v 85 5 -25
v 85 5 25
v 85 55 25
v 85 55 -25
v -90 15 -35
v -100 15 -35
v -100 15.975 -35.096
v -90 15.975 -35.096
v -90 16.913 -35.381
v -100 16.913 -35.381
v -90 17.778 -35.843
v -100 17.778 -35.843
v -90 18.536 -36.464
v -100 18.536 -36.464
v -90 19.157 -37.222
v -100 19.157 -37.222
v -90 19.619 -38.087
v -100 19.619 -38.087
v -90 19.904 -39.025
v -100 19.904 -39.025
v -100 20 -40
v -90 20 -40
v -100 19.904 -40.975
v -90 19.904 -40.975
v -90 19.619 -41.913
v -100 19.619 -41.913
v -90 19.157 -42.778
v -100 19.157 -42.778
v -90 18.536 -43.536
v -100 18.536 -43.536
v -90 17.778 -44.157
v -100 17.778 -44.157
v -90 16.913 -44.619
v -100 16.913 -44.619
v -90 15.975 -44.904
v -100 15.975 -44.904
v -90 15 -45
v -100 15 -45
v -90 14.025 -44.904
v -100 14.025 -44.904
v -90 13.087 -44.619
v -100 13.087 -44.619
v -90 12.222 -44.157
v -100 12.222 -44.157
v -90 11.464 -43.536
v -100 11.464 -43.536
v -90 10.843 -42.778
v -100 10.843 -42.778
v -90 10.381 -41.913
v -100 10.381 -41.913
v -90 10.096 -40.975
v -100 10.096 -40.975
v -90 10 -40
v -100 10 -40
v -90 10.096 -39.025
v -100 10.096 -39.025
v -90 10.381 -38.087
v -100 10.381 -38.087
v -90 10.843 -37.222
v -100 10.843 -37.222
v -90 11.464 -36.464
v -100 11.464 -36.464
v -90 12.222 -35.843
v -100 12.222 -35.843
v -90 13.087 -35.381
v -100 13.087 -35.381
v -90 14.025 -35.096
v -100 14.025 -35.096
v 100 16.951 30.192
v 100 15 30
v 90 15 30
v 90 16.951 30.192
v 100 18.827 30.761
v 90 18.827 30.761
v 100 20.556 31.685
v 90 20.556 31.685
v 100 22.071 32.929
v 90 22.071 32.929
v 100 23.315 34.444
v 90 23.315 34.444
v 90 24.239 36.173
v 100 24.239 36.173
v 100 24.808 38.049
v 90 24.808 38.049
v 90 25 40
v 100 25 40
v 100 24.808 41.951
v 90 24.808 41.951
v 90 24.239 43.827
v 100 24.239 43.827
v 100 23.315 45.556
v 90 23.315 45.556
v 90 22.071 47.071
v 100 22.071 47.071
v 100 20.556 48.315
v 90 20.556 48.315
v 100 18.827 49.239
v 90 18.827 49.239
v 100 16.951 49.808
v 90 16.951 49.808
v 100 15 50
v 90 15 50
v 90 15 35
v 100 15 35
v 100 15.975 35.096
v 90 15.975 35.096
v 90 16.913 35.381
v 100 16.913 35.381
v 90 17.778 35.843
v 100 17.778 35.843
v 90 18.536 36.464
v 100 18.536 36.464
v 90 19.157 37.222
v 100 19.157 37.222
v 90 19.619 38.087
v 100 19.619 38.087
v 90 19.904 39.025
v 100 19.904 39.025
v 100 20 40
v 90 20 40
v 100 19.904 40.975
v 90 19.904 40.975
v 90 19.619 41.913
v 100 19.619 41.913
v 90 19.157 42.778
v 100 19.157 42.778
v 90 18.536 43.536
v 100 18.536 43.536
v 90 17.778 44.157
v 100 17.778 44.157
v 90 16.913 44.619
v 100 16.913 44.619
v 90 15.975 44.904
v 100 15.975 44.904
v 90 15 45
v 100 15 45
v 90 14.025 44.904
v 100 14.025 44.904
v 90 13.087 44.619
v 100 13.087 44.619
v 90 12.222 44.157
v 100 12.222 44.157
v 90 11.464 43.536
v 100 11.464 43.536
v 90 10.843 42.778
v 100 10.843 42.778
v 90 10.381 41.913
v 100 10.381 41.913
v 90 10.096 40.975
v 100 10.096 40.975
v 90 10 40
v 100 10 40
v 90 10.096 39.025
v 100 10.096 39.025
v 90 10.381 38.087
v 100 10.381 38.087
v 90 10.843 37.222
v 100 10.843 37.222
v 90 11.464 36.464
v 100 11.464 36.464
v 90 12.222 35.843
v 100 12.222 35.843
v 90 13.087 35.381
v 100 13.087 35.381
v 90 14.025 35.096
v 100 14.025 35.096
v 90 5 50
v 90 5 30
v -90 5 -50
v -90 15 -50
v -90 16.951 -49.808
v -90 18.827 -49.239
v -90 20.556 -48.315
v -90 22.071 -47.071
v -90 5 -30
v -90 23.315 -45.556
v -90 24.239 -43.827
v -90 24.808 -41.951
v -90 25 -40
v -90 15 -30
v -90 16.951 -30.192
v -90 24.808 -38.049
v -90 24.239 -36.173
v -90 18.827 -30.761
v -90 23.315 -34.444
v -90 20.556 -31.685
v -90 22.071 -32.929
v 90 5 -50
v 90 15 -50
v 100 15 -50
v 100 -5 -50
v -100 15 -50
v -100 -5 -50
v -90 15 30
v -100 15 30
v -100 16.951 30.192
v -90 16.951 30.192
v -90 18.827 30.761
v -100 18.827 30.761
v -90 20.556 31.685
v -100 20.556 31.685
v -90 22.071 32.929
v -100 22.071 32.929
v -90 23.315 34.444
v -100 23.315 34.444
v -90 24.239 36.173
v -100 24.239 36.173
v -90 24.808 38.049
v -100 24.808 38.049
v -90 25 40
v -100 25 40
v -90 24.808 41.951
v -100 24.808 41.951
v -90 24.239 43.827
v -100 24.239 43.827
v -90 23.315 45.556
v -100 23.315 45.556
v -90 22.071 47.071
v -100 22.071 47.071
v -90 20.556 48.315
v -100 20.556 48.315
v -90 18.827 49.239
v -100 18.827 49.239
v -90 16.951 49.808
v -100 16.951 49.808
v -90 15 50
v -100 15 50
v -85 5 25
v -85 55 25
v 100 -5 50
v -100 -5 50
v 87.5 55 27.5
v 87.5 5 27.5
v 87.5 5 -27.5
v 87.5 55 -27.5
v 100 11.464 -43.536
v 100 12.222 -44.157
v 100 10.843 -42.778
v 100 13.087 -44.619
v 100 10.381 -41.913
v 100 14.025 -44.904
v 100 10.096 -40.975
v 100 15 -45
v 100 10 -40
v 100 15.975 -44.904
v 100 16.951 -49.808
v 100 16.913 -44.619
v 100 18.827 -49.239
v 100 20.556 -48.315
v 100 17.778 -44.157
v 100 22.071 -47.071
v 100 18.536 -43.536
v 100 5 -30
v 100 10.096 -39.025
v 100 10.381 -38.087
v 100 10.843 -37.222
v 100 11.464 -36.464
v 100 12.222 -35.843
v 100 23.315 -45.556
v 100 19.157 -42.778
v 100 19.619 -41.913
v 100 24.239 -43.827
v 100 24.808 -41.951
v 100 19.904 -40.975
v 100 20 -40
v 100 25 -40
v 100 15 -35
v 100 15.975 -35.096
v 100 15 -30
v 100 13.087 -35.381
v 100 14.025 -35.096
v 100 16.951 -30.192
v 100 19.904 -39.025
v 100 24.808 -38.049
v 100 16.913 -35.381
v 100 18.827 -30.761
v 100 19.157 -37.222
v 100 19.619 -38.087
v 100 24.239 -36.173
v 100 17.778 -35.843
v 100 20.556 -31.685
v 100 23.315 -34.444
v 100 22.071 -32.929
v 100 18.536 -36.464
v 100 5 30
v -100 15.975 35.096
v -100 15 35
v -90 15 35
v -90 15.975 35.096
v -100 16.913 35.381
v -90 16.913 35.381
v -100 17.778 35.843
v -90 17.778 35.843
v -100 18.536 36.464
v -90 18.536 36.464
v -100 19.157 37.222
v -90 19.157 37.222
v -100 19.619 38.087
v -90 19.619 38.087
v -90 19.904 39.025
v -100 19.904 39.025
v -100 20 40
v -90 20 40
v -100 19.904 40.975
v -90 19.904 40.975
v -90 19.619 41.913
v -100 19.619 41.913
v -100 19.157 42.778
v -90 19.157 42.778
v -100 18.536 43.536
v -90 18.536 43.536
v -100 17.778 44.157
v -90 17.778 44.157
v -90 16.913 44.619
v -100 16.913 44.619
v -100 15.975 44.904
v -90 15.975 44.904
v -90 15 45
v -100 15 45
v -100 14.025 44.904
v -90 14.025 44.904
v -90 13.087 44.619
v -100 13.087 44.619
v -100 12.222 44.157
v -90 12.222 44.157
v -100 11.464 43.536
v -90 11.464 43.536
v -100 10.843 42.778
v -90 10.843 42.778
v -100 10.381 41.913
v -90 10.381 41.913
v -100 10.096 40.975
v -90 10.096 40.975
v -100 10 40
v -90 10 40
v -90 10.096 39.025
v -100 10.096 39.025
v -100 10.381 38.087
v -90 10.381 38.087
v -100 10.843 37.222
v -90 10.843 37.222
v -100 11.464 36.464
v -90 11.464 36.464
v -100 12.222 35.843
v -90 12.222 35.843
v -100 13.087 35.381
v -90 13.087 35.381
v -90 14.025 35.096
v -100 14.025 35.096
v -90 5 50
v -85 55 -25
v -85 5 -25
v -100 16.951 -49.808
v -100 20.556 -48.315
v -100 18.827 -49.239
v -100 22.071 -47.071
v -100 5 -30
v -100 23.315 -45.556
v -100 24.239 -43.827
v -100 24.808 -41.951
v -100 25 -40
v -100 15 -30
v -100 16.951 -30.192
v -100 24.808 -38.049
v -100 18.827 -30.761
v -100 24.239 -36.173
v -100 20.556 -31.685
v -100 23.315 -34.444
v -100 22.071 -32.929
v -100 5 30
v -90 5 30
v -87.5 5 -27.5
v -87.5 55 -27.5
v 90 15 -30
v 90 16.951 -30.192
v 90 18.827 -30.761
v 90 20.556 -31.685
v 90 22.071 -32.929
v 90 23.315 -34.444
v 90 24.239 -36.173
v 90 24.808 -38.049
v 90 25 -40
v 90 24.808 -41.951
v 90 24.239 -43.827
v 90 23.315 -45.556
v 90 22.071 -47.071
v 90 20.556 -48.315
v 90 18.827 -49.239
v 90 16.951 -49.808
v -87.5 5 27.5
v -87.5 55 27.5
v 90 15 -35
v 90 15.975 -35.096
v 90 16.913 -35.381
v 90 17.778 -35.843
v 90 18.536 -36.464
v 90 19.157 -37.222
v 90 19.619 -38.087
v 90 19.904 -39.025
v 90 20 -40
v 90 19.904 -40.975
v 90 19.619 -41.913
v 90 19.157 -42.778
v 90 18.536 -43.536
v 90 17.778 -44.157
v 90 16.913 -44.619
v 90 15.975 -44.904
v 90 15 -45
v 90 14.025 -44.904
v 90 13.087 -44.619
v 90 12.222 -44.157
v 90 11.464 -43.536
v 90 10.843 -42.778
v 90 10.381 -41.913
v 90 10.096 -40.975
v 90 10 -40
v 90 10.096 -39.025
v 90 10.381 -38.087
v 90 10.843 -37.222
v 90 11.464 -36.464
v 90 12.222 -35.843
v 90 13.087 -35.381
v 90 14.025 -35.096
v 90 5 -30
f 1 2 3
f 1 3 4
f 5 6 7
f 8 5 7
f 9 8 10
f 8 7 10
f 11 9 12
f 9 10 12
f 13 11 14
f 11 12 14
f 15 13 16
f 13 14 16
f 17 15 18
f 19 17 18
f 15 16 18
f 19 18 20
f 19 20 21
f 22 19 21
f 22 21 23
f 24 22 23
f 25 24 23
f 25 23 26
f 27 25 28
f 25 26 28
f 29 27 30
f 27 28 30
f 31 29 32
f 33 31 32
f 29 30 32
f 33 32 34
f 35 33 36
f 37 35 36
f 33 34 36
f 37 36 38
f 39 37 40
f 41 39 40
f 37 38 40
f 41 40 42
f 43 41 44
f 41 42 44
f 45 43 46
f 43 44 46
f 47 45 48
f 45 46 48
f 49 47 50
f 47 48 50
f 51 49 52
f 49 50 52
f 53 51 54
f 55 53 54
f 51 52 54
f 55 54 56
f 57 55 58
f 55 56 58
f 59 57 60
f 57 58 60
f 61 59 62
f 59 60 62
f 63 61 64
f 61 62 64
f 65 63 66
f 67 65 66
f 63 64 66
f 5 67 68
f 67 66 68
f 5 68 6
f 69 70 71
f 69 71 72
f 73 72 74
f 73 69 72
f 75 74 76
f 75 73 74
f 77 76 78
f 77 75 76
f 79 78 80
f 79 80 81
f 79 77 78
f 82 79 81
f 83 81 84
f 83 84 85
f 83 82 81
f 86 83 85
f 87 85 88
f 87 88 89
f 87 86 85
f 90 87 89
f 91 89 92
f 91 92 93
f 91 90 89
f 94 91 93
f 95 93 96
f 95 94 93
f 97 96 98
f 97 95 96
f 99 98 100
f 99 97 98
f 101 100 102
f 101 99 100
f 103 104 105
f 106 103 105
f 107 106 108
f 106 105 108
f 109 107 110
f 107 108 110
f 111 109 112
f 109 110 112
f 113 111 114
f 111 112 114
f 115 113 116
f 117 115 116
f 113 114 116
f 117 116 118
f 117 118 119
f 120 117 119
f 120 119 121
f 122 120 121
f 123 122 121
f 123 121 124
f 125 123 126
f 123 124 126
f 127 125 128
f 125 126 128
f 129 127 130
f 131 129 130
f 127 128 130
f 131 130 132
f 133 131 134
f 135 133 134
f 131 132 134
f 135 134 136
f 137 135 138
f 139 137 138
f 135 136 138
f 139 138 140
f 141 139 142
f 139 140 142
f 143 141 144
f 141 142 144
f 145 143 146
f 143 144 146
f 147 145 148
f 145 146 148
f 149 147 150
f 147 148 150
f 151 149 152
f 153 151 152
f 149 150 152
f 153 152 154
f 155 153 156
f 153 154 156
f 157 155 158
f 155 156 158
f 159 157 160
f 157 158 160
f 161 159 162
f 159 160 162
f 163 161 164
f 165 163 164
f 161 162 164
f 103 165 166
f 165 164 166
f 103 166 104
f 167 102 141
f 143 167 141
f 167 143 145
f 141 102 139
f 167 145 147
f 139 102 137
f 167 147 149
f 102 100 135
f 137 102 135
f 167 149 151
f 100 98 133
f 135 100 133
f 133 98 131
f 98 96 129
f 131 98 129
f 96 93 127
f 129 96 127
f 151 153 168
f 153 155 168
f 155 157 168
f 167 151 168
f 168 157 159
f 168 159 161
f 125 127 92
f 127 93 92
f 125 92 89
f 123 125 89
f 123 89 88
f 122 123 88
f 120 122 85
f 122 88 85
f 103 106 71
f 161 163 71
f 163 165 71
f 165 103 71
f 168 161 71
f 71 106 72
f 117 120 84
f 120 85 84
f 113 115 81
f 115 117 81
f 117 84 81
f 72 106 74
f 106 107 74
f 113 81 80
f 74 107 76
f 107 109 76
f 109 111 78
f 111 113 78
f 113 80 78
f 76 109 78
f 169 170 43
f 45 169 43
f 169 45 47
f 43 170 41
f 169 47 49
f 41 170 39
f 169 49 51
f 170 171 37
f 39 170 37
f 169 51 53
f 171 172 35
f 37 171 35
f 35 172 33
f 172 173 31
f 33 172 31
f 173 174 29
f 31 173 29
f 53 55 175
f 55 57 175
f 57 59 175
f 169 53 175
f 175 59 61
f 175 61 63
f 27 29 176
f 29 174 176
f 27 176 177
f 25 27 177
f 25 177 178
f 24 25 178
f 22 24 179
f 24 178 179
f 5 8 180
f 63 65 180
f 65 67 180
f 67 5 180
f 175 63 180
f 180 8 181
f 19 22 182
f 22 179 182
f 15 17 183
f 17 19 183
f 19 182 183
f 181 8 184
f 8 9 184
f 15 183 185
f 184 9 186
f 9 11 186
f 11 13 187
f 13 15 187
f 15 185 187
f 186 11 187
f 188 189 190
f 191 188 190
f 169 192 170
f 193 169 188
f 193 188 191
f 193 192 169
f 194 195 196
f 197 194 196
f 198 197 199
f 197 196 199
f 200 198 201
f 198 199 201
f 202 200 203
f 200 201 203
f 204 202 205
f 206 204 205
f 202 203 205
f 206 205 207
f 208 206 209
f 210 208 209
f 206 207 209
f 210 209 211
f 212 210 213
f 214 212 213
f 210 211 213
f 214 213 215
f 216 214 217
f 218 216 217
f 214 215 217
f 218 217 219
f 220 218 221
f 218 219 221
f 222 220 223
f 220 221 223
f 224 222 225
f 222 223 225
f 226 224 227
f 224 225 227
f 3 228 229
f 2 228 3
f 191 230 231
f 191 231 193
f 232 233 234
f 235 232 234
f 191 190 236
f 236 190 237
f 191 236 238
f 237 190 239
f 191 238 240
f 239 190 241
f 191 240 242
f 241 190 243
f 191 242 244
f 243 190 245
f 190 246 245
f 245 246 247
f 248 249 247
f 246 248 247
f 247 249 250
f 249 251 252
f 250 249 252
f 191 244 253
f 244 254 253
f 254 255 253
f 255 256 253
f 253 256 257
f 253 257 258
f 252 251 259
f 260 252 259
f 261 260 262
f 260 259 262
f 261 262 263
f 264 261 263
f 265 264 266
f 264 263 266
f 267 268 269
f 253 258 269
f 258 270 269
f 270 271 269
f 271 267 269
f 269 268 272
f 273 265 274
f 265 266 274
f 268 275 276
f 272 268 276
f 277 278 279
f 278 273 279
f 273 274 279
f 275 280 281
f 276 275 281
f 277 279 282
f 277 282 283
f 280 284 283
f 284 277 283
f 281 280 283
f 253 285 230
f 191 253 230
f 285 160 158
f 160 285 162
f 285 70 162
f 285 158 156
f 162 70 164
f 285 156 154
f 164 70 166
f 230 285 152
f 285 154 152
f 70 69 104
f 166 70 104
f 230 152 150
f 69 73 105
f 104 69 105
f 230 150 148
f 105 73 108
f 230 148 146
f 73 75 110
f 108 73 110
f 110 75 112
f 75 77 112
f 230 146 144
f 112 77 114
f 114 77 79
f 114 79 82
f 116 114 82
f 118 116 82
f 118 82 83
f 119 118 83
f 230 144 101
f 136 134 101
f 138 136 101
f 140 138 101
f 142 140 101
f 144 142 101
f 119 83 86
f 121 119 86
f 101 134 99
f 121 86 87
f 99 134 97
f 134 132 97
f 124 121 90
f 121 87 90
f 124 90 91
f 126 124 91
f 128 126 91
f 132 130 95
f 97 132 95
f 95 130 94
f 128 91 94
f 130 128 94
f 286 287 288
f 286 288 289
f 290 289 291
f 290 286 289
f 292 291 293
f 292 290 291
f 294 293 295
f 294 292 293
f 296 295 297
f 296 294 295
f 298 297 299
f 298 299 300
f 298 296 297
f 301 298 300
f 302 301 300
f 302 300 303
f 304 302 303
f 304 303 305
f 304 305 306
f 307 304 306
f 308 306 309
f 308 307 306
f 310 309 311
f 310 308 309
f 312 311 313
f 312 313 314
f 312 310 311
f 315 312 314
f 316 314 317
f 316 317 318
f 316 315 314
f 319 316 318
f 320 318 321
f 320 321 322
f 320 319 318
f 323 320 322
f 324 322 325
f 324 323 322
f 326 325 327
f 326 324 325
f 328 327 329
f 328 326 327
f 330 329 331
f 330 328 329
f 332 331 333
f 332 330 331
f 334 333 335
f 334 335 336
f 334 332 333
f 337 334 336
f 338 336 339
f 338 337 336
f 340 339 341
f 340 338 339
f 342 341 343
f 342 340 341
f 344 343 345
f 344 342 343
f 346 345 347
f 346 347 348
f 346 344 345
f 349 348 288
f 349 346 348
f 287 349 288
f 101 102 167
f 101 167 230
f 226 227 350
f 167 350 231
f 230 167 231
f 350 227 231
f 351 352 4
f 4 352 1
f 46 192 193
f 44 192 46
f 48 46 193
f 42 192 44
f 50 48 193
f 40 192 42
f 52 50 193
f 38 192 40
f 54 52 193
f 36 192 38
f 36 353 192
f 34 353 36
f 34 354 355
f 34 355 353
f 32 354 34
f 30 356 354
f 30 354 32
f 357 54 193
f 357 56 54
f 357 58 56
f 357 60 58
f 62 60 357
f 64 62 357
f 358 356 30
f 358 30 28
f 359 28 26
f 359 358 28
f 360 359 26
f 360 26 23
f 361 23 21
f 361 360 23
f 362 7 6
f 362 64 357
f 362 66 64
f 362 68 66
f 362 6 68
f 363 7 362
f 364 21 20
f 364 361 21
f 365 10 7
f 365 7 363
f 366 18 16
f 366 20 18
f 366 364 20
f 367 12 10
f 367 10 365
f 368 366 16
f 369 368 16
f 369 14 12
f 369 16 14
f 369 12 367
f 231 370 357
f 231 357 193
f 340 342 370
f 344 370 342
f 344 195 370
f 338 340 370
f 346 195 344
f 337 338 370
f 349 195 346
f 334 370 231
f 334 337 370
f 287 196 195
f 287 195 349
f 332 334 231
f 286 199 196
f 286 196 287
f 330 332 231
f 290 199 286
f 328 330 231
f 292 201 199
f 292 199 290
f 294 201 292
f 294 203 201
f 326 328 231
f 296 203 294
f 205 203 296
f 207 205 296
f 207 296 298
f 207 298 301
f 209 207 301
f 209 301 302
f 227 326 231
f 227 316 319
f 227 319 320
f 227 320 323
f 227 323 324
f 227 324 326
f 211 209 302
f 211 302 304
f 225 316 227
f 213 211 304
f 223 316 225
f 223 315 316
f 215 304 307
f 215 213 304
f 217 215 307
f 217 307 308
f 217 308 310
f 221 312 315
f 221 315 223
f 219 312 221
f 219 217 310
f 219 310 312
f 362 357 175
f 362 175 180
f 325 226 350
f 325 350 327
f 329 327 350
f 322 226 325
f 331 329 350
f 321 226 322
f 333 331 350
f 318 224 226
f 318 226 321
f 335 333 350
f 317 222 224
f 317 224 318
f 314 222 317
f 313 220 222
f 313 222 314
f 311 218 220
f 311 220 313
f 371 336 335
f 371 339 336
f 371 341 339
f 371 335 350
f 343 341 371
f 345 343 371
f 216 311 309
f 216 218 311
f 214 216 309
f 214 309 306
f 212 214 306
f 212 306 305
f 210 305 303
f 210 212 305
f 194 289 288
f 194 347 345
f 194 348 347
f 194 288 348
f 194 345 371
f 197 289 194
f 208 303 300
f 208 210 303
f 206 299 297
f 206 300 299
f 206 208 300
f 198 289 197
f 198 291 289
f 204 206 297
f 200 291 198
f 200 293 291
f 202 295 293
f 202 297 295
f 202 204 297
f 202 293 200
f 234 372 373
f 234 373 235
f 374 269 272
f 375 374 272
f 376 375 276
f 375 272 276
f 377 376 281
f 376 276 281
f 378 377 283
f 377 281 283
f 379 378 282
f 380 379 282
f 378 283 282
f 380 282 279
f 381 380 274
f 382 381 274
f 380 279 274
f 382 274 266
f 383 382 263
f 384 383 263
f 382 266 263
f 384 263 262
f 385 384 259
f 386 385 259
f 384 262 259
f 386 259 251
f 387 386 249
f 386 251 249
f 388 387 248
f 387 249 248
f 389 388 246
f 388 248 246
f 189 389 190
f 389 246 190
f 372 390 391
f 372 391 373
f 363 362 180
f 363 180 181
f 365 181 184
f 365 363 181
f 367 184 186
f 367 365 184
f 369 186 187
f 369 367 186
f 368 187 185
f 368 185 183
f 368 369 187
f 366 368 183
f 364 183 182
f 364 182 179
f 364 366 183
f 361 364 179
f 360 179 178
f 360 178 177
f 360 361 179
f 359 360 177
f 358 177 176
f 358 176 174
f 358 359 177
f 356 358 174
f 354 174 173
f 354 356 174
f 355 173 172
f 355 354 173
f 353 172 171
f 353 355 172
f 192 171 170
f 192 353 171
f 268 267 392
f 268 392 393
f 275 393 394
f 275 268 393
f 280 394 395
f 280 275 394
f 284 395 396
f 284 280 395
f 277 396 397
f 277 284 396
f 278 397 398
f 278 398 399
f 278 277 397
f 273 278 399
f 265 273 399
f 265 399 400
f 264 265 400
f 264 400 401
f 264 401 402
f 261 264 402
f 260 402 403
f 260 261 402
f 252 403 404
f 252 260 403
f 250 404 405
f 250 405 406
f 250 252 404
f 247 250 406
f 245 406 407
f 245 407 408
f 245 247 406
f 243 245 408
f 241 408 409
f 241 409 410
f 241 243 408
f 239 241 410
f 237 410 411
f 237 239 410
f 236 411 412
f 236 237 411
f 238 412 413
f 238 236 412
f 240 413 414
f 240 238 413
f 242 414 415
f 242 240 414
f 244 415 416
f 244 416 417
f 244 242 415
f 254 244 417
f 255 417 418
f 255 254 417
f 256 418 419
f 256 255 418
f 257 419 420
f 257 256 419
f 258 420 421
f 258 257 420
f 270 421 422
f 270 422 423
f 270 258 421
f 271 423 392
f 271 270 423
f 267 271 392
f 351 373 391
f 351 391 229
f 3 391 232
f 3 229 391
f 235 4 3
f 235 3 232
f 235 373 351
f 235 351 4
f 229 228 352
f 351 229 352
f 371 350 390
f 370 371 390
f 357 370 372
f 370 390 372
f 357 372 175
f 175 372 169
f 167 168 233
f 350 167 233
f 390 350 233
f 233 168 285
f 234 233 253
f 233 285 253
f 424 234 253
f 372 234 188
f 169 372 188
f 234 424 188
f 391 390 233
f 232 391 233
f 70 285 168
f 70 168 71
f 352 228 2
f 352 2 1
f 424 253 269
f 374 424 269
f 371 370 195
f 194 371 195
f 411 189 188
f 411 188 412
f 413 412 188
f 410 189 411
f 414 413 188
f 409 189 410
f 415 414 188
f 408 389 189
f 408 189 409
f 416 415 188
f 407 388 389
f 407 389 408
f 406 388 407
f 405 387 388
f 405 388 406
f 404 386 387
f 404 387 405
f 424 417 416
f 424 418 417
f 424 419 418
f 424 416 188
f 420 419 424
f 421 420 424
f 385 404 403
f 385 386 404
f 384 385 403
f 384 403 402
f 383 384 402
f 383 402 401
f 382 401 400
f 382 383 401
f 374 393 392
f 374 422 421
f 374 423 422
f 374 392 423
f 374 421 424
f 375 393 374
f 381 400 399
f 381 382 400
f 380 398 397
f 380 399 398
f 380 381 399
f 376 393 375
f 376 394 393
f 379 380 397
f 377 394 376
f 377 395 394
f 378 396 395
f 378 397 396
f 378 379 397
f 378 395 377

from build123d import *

# Parameters (mm, degrees)
SKETCH1_W                 = 100
SKETCH1_H                 = 10
BOSS_EXTRUDE1_DEPTH       = 100
SKETCH2_R                 = 10
SKETCH2_R_2               = 5
BOSS_EXTRUDE2_DEPTH       = 10
MIRROR2_COPY_1_SKETCH_R   = 10
MIRROR2_COPY_1_SKETCH_R_2 = 5
MIRROR2_COPY_1_DEPTH      = 10
SKETCH3_W                 = 175
SKETCH3_H                 = 55
SKETCH3_W_2               = 170
SKETCH3_H_2               = 50
BOSS_EXTRUDE5_DEPTH       = 50


with BuildPart() as part:
    # Sketch1 → Boss-Extrude1 (new body, symmetric)
    with BuildSketch(Plane(origin=(0, 0, 0), x_dir=(0, 0, -1), z_dir=(1, 0, 0))):
        Rectangle(SKETCH1_W, SKETCH1_H)
    extrude(amount=BOSS_EXTRUDE1_DEPTH, both=True)

    # Sketch2 → Boss-Extrude2 (add)
    with BuildSketch(Plane(origin=(100, 0, 0), x_dir=(0, 0, -1), z_dir=(1, 0, 0))):
        with Locations((-40, 15)):
            Circle(SKETCH2_R)
        with Locations((-40, 15)):
            Circle(SKETCH2_R_2, mode=Mode.SUBTRACT)
        with BuildLine():
            ThreePointArc((-40, 5), (-47.071067812, 7.928932188), (-50, 15))
            Line((-50, 15), (-50, 5))
            Line((-50, 5), (-40, 5))
        make_face()
        with BuildLine():
            Line((-30, 5), (-30, 15))
            ThreePointArc((-30, 15), (-32.928932188, 7.928932188), (-40, 5))
            Line((-40, 5), (-30, 5))
        make_face()
    boss_extrude2 = extrude(amount=-BOSS_EXTRUDE2_DEPTH)

    # Mirror1: Boss-Extrude2 across plane
    add(boss_extrude2.mirror(Plane.XY))

    # Mirror2: Boss-Extrude2 across plane
    add(boss_extrude2.mirror(Plane(origin=(0, 0, 0), x_dir=(0, 0, 1), z_dir=(1, 0, 0))))

    # Mirror2 copy 1 sketch → Mirror2 copy 1 (add)
    with BuildSketch(Plane.ZY.offset(100)):
        with Locations((-40, 15)):
            Circle(MIRROR2_COPY_1_SKETCH_R)
        with Locations((-40, 15)):
            Circle(MIRROR2_COPY_1_SKETCH_R_2, mode=Mode.SUBTRACT)
        with BuildLine():
            ThreePointArc((-40, 5), (-47.071067812, 7.928932188), (-50, 15))
            Line((-50, 15), (-50, 5))
            Line((-50, 5), (-40, 5))
        make_face()
        with BuildLine():
            Line((-30, 5), (-30, 15))
            ThreePointArc((-30, 15), (-32.928932188, 7.928932188), (-40, 5))
            Line((-40, 5), (-30, 5))
        make_face()
    extrude(amount=-MIRROR2_COPY_1_DEPTH)

    # Sketch3 → Boss-Extrude5 (add)
    with BuildSketch(Plane(origin=(0, 5, 0), x_dir=(1, 0, 0), z_dir=(0, 1, 0))):
        Rectangle(SKETCH3_W, SKETCH3_H)
        Rectangle(SKETCH3_W_2, SKETCH3_H_2, mode=Mode.SUBTRACT)
    extrude(amount=BOSS_EXTRUDE5_DEPTH)


solid = part.part
